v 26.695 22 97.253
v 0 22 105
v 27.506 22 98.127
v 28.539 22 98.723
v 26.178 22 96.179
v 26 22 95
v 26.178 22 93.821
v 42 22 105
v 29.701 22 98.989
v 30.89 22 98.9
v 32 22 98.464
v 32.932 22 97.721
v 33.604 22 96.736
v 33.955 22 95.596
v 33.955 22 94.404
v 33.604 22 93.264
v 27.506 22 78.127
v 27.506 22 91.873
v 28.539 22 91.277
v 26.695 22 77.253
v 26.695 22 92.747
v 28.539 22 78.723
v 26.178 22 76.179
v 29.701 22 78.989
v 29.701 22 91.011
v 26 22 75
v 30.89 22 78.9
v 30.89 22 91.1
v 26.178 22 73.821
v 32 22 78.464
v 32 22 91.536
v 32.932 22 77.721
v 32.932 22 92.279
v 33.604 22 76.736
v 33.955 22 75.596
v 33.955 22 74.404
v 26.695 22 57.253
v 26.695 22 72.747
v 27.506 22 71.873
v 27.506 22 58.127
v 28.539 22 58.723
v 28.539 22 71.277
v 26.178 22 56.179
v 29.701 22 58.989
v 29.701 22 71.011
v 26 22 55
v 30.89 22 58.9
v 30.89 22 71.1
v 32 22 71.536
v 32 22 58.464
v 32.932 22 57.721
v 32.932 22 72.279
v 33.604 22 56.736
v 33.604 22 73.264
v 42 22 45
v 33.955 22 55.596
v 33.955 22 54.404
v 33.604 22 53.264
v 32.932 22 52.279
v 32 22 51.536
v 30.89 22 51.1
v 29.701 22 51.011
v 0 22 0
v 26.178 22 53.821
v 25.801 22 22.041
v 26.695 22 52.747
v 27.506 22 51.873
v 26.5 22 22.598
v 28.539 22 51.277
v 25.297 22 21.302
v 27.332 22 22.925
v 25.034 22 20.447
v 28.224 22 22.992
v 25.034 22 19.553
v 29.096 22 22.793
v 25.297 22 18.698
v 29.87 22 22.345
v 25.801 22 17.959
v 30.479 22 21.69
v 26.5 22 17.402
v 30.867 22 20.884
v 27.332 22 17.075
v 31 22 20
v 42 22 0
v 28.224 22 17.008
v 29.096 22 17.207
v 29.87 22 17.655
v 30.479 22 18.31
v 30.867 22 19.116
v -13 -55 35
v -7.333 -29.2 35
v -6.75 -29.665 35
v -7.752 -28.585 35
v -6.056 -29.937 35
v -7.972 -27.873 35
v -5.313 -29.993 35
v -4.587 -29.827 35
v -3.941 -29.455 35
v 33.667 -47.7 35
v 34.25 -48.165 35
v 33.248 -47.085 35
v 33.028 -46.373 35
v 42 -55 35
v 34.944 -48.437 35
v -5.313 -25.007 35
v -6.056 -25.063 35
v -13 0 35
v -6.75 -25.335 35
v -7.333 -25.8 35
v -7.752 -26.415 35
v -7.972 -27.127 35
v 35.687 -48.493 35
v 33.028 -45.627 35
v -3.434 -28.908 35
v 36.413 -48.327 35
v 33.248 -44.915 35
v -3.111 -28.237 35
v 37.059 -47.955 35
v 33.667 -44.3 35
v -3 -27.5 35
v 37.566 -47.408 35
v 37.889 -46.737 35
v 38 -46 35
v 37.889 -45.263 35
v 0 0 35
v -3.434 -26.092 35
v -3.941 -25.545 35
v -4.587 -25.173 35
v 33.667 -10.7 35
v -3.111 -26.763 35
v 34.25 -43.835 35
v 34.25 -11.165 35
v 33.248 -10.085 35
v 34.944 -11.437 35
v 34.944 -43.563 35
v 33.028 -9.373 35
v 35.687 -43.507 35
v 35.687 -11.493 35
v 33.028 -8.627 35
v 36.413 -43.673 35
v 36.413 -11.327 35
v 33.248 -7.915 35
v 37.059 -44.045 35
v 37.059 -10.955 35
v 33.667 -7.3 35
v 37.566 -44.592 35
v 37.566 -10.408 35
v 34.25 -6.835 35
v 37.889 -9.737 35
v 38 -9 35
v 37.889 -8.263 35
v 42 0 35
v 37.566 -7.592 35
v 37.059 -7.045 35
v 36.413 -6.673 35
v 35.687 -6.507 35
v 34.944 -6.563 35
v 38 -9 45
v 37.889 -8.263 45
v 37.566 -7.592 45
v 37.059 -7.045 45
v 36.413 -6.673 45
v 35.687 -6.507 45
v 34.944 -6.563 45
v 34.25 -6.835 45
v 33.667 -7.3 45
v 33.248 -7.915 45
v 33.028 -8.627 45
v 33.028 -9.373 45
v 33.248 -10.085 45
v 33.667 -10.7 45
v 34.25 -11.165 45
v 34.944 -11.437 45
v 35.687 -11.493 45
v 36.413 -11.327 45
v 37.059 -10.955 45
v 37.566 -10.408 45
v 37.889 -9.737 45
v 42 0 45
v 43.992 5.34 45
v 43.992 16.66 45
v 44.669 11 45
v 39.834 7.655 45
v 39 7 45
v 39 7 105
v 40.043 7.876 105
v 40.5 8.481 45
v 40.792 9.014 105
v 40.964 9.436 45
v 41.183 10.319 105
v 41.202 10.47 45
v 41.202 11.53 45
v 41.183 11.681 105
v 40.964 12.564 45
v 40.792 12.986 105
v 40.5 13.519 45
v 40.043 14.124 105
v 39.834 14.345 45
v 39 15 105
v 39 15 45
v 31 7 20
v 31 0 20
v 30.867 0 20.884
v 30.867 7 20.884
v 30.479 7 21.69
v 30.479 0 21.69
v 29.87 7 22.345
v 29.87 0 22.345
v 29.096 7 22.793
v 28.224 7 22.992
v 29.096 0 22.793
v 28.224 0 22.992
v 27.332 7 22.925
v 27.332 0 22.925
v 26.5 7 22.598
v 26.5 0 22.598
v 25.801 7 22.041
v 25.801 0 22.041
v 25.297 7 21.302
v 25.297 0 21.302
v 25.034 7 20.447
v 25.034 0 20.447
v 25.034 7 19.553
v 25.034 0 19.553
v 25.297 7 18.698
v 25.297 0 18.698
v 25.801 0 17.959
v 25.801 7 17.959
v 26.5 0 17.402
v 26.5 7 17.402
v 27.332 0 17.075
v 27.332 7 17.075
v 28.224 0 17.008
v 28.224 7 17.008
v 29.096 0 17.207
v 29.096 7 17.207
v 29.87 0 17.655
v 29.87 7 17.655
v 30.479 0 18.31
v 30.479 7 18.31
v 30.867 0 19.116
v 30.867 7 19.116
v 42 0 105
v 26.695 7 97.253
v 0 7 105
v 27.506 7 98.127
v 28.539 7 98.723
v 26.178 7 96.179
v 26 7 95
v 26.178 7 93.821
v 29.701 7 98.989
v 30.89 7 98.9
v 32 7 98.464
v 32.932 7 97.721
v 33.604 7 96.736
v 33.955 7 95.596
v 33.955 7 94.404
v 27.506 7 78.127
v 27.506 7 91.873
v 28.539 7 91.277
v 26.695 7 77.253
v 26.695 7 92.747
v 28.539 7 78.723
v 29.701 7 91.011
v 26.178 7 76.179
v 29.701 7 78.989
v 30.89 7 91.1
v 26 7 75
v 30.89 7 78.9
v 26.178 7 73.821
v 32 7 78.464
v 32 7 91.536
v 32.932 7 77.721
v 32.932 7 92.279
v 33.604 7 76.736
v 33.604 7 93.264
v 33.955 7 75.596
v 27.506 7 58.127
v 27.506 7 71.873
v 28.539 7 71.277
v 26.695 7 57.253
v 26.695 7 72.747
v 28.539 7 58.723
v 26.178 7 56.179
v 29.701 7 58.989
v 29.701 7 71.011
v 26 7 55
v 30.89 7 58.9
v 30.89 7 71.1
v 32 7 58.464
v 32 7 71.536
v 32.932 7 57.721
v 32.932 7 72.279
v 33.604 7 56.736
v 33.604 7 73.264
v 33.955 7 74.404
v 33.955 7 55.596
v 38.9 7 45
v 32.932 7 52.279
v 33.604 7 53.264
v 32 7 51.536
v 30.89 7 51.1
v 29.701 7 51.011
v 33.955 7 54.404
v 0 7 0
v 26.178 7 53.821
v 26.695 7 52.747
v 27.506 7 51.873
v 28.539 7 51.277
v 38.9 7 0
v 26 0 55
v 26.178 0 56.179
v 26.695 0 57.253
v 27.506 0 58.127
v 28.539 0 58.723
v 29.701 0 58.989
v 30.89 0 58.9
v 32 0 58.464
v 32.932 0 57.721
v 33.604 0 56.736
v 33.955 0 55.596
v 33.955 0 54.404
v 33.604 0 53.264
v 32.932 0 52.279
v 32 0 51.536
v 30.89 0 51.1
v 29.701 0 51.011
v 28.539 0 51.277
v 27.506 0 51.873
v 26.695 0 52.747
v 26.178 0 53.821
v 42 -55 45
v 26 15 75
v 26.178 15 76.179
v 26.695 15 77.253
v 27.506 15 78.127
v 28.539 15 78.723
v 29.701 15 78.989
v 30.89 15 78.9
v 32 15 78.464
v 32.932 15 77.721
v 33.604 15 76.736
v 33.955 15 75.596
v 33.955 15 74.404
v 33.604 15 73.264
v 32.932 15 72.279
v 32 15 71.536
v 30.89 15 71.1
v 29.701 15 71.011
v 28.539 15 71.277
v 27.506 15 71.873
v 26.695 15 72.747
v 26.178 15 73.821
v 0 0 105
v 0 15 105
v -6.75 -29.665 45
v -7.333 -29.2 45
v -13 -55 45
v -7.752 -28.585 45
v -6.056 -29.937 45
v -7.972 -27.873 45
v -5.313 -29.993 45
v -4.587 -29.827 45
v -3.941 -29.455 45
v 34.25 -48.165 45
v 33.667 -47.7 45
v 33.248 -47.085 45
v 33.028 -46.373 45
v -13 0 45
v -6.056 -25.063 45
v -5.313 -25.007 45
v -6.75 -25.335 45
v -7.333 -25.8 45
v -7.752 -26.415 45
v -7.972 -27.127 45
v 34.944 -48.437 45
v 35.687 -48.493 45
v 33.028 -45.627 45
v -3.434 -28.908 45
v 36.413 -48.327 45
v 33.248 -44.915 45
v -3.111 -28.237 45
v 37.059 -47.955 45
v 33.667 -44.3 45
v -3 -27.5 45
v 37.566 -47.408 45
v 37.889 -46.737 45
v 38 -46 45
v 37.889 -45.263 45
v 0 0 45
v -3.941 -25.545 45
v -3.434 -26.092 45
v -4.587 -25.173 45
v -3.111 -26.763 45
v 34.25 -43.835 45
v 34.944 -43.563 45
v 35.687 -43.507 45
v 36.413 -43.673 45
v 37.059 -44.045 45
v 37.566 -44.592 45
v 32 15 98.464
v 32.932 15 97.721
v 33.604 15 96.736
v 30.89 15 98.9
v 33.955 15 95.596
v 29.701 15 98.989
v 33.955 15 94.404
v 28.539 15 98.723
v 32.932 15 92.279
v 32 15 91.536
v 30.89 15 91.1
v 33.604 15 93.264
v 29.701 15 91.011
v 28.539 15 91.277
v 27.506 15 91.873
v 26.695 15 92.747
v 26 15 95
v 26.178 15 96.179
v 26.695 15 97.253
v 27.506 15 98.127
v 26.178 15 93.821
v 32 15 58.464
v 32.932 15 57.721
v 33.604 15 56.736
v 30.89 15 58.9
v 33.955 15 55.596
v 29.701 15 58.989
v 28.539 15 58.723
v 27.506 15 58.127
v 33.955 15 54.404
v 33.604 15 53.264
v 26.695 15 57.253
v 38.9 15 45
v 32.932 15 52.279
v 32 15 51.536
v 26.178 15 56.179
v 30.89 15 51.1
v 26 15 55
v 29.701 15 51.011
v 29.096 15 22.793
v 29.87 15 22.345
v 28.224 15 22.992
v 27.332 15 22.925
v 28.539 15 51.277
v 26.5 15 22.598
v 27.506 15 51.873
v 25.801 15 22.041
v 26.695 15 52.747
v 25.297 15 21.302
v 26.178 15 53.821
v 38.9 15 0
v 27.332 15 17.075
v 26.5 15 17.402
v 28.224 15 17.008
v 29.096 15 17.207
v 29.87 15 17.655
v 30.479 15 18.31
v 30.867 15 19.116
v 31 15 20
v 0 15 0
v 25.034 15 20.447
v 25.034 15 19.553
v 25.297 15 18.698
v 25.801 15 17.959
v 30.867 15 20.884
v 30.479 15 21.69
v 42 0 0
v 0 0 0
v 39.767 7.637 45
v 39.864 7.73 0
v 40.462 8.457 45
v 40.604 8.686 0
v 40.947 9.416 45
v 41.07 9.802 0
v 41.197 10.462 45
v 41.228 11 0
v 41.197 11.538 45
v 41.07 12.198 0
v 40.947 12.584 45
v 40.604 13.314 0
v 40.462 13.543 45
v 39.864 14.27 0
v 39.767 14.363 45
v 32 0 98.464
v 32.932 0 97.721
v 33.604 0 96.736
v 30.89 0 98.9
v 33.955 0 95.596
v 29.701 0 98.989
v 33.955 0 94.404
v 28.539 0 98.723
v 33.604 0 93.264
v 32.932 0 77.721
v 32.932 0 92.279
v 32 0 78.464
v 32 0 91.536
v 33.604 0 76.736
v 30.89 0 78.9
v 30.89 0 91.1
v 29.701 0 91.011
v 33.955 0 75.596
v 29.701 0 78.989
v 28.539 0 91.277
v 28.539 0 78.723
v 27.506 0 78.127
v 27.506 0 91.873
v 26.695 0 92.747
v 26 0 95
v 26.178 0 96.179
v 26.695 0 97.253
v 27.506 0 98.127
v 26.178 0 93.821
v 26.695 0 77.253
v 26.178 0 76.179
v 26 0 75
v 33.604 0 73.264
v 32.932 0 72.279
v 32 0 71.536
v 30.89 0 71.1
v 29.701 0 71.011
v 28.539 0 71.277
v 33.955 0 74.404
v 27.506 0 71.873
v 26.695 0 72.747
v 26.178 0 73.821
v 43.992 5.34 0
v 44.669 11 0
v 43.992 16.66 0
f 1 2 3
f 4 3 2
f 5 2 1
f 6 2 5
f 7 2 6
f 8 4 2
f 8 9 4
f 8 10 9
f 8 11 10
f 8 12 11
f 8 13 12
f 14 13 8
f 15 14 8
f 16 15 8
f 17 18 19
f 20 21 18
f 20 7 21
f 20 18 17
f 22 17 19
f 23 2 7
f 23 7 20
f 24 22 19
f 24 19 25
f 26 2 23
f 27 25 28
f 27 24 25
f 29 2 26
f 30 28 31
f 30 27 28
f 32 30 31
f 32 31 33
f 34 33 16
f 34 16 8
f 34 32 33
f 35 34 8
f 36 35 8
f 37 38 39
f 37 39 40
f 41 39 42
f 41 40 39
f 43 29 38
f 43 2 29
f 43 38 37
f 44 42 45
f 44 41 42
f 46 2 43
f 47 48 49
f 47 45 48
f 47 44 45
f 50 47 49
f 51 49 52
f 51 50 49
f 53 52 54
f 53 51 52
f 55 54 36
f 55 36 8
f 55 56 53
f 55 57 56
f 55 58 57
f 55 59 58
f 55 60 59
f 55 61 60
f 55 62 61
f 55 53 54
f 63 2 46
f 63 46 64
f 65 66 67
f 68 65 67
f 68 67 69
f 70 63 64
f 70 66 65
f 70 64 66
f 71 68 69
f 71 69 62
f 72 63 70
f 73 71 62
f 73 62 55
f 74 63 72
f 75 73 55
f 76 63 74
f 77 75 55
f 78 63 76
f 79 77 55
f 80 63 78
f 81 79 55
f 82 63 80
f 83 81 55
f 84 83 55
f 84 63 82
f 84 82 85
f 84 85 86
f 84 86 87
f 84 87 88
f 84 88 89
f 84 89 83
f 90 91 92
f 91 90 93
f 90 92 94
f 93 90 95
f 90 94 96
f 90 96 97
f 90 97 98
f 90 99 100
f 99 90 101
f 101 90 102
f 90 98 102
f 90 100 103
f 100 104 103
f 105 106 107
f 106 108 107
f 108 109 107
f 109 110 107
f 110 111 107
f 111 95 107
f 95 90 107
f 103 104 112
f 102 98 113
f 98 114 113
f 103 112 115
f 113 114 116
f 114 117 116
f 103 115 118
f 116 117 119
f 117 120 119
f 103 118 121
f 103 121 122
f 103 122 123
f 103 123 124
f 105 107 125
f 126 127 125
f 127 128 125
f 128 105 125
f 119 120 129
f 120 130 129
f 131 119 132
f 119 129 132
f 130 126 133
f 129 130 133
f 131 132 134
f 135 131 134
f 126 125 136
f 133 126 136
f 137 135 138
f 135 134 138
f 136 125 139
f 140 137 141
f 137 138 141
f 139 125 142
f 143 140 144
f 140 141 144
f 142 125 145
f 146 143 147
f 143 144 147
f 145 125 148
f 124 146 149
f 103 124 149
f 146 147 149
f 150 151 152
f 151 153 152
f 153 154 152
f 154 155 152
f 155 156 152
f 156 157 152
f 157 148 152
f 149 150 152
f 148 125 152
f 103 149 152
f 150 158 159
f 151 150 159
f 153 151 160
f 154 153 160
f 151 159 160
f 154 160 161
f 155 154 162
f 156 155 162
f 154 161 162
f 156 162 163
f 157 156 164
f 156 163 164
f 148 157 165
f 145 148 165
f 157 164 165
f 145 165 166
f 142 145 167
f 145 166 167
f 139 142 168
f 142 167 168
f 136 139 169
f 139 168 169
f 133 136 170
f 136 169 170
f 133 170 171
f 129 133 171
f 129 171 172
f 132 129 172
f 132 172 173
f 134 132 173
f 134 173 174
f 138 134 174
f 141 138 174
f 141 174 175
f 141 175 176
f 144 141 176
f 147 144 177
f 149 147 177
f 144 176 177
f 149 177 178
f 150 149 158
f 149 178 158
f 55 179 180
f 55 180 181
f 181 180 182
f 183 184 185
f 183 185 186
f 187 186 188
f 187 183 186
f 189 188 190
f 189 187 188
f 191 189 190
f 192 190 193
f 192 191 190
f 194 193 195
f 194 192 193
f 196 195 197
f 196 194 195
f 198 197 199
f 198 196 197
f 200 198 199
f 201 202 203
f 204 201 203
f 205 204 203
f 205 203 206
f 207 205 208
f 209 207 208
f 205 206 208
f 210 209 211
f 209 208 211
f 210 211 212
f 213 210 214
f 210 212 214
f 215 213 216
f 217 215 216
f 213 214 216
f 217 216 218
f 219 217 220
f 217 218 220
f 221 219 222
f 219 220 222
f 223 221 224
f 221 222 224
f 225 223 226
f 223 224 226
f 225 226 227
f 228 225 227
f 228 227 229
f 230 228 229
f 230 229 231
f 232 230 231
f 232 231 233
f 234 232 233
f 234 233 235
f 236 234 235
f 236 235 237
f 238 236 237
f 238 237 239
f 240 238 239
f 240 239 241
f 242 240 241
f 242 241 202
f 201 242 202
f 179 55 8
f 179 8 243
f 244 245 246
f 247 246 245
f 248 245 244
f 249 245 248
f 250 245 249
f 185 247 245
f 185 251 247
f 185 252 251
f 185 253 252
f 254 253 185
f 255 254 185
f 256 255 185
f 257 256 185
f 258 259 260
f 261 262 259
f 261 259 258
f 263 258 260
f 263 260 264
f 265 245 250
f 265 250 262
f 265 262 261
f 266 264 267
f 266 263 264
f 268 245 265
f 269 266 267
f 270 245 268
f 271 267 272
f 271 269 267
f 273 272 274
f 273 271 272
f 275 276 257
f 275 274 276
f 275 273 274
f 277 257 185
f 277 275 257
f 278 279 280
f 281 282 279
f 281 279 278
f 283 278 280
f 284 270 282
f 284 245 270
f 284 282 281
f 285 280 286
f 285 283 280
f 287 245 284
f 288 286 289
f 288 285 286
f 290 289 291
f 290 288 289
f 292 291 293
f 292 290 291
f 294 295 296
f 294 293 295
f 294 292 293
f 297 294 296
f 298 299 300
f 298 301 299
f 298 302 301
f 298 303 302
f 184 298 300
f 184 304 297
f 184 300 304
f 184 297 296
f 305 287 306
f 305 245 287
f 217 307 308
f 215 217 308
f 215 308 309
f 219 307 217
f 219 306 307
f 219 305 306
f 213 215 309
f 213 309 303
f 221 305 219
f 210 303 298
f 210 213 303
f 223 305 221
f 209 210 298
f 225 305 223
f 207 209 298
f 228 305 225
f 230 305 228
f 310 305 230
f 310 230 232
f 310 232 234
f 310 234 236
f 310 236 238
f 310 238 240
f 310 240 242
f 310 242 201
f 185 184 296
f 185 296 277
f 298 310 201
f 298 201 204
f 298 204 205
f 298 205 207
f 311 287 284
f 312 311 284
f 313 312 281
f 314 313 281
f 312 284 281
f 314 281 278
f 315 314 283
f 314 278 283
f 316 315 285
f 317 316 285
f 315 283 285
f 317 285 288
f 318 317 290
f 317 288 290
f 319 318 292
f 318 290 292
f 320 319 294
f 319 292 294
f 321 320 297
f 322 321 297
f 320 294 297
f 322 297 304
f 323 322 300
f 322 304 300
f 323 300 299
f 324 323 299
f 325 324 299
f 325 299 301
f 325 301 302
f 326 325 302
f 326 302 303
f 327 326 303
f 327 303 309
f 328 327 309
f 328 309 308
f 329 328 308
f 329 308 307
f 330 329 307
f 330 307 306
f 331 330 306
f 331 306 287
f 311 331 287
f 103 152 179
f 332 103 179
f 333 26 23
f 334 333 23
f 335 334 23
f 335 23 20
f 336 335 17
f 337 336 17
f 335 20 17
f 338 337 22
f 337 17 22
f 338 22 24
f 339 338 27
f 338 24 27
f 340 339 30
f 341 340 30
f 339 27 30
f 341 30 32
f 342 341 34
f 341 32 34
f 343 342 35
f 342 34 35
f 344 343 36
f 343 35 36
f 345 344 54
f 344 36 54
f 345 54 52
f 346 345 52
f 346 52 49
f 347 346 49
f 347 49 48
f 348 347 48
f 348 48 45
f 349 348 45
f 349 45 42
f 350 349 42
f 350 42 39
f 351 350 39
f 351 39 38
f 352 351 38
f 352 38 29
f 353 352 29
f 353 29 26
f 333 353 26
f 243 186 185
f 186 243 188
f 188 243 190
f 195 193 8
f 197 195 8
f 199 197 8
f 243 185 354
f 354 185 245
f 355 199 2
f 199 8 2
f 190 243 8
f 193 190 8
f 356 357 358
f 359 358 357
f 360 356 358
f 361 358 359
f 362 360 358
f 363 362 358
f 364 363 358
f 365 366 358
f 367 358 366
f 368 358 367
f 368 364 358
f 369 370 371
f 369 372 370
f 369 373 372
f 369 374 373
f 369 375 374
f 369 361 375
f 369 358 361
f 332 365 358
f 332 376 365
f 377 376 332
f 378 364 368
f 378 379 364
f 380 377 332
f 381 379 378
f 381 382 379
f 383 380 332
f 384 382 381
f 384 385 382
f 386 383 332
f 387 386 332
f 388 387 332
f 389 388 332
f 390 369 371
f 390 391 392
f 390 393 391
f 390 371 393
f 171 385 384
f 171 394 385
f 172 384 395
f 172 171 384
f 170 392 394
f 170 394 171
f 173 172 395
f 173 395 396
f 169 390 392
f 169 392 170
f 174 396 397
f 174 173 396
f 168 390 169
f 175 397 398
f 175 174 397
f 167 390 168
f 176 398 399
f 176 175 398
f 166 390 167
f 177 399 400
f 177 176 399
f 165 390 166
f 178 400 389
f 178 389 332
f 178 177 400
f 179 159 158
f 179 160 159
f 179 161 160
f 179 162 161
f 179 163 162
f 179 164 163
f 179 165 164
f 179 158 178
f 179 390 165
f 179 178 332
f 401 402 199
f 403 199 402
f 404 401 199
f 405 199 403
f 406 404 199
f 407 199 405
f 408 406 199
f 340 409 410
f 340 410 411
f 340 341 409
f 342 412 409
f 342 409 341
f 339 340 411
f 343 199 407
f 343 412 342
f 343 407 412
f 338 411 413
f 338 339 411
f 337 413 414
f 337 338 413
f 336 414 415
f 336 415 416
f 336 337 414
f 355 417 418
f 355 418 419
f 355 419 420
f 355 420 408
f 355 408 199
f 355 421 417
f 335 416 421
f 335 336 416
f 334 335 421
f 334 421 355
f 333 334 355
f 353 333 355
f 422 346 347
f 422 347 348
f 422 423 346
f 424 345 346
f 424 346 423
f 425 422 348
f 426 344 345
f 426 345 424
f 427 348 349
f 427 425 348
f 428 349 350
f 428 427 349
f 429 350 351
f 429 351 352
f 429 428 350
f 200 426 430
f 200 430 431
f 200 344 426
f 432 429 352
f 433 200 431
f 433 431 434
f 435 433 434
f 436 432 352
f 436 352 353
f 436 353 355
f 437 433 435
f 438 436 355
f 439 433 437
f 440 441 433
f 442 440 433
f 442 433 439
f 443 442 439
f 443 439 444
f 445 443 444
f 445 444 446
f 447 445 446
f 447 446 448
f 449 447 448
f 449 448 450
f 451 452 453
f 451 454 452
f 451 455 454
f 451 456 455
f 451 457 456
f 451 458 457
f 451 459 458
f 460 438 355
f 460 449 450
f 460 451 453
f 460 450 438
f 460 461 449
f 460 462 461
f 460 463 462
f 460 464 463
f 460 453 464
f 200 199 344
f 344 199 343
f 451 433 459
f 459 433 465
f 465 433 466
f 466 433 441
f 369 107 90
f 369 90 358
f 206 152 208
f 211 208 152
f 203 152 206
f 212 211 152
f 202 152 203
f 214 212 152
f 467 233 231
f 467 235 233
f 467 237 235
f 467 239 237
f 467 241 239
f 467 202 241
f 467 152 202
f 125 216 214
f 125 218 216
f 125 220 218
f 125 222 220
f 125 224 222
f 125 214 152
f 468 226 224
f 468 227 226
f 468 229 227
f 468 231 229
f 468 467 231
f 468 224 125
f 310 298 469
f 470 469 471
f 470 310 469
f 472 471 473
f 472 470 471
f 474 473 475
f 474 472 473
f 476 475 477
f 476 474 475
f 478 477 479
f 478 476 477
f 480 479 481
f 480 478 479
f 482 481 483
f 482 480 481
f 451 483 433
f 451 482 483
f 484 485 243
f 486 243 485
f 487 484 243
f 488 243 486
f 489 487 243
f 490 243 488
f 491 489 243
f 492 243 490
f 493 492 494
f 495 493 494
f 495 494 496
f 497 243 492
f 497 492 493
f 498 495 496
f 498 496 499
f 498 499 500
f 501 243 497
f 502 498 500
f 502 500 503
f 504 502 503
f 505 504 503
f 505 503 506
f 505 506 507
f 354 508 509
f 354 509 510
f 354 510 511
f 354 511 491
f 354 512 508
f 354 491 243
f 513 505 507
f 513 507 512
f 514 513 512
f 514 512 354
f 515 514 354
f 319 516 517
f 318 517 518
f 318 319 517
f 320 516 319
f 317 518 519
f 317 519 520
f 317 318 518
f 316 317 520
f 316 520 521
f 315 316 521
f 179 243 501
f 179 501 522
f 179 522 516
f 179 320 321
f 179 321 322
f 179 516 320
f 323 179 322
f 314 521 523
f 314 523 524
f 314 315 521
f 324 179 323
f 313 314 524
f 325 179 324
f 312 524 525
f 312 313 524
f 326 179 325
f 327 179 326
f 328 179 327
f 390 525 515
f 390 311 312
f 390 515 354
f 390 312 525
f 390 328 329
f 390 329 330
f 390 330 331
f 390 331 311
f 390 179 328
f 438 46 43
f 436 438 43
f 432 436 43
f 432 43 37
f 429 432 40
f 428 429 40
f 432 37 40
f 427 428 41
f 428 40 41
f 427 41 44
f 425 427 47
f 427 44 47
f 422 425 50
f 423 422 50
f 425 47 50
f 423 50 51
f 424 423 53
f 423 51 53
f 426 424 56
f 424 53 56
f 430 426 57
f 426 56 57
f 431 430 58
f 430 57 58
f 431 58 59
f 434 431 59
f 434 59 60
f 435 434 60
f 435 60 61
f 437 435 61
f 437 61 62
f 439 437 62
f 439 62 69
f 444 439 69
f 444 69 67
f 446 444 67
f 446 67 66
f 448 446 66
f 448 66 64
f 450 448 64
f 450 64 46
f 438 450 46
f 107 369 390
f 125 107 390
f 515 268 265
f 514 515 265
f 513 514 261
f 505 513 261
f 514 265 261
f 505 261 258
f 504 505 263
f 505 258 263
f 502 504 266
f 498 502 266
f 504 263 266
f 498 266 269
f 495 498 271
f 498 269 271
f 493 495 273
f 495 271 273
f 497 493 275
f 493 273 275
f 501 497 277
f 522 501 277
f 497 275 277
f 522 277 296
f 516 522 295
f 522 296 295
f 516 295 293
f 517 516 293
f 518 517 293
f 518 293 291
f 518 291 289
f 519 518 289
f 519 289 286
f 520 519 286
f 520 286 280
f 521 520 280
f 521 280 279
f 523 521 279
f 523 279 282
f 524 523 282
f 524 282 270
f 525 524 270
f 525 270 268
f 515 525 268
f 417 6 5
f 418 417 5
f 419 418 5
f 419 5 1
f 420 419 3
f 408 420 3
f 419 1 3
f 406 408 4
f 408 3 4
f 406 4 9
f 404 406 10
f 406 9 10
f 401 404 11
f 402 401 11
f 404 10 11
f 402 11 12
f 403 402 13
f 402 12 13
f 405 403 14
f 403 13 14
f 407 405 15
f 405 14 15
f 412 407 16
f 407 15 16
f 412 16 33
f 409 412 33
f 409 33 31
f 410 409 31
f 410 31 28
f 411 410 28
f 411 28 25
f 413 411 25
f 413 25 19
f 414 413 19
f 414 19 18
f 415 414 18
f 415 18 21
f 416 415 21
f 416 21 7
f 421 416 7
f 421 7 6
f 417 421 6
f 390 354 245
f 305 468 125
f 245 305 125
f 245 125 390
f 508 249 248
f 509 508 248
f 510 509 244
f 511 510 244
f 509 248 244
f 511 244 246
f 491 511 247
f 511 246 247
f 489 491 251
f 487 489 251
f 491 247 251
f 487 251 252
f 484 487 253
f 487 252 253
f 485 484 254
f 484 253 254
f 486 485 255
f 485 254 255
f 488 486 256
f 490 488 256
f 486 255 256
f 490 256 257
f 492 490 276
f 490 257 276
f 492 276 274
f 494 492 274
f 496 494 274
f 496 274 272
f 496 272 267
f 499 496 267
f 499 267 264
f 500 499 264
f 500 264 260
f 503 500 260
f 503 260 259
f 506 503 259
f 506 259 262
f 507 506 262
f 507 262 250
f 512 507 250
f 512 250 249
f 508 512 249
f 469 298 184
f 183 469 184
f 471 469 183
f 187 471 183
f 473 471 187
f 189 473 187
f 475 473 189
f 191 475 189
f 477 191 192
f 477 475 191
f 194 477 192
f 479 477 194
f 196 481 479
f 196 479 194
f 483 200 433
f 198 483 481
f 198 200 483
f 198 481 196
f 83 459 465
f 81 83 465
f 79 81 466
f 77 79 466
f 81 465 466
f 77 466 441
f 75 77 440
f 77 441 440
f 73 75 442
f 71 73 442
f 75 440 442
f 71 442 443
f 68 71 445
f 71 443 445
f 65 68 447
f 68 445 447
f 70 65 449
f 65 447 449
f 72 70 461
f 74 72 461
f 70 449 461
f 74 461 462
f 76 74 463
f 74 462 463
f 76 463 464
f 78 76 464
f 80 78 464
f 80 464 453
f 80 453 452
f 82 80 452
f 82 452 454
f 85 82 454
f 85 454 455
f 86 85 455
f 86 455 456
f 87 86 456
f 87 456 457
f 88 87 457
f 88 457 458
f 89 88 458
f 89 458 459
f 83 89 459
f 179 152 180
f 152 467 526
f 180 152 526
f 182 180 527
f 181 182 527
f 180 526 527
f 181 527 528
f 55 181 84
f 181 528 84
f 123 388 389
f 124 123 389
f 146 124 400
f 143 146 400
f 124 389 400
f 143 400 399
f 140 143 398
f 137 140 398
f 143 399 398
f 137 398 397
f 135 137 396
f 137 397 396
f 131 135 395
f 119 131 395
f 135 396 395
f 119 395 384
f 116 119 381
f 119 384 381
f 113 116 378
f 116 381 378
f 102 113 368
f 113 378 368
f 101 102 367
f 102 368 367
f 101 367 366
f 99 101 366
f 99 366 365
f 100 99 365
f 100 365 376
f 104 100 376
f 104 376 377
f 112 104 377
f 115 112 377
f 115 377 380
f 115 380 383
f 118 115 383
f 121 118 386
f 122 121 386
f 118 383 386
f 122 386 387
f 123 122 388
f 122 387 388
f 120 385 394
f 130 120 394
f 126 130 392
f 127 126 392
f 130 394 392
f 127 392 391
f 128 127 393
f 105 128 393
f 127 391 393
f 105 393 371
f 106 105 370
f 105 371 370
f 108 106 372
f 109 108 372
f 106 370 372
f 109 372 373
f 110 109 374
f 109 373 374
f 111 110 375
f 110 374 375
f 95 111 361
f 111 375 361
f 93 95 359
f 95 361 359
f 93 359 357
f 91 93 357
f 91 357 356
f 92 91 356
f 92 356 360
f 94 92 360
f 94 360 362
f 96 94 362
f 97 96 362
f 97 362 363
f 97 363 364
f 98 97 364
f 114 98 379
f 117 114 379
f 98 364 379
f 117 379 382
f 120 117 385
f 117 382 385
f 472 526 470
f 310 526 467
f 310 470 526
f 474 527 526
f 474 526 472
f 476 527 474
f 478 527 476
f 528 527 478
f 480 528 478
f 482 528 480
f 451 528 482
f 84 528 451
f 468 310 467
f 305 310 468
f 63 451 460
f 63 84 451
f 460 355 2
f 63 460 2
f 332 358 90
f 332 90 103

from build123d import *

# Parameters (mm, degrees)
PAD_DEPTH       = 45
SKETCH001_W     = 55
SKETCH001_H     = 10
PAD001_DEPTH    = 55
SKETCH002_R     = 3
POCKET_DEPTH    = 22
SKETCH003_R     = 2.5
POCKET001_DEPTH = 10
PAD002_DEPTH    = 60
SKETCH005_R     = 4
POCKET002_DEPTH = 22


with BuildPart() as part:
    # Sketch → Pad (new body)
    with BuildSketch(Plane.XY):
        with BuildLine():
            Line((0, 22), (42, 22))
            ThreePointArc((42, 0), (44.669271, 11), (42, 22))
            Line((42, 0), (0, 0))
            Line((0, 7), (0, 0))
            Line((38.9, 7), (0, 7))
            ThreePointArc((38.9, 7), (41.228437, 11), (38.9, 15))
            Line((0, 15), (38.9, 15))
            Line((0, 22), (0, 15))
        make_face()
    extrude(amount=PAD_DEPTH)

    # Sketch001 (on Face4 of Pad) → Pad001 (join)
    with BuildSketch(Plane.XZ):
        with Locations((14.5, 40)):
            Rectangle(SKETCH001_W, SKETCH001_H)
    extrude(amount=PAD001_DEPTH)

    # Sketch002 (on Face8 of Pad001) → Pocket (cut)
    with BuildSketch(Plane.XZ):
        with Locations((28, 20)):
            Circle(SKETCH002_R)
    extrude(amount=-POCKET_DEPTH, mode=Mode.SUBTRACT)

    # Sketch003 (on Face12 of Pocket) → Pocket001 (cut)
    with BuildSketch(Plane.XY.offset(45)):
        with Locations((35.5, -9)):
            Circle(SKETCH003_R)
        with Locations((35.5, -46)):
            Circle(SKETCH003_R)
        with Locations((-5.5, -27.5)):
            Circle(SKETCH003_R)
    extrude(amount=-POCKET001_DEPTH, mode=Mode.SUBTRACT)

    # Sketch004 (on Face5 of Pocket001) → Pad002 (join)
    with BuildSketch(Plane.XY.offset(45)):
        with BuildLine():
            Line((0, 22), (42, 22))
            Line((42, 22), (42, 0))
            Line((42, 0), (0, 0))
            Line((0, 0), (0, 7))
            Line((0, 7), (39, 7))
            ThreePointArc((39, 7), (41.232207, 11), (39, 15))
            Line((39, 15), (0, 15))
            Line((0, 15), (0, 22))
        make_face()
    extrude(amount=PAD002_DEPTH)

    # Sketch005 (on Face6 of Pad002) → Pocket002 (cut)
    with BuildSketch(Plane(origin=(0, 22, 0), x_dir=(-1, 0, 0), z_dir=(0, 1, 0))):
        with Locations((-30, 55)):
            Circle(SKETCH005_R)
        with Locations((-30, 75)):
            Circle(SKETCH005_R)
        with Locations((-30, 95)):
            Circle(SKETCH005_R)
    extrude(amount=-POCKET002_DEPTH, mode=Mode.SUBTRACT)


solid = part.part
